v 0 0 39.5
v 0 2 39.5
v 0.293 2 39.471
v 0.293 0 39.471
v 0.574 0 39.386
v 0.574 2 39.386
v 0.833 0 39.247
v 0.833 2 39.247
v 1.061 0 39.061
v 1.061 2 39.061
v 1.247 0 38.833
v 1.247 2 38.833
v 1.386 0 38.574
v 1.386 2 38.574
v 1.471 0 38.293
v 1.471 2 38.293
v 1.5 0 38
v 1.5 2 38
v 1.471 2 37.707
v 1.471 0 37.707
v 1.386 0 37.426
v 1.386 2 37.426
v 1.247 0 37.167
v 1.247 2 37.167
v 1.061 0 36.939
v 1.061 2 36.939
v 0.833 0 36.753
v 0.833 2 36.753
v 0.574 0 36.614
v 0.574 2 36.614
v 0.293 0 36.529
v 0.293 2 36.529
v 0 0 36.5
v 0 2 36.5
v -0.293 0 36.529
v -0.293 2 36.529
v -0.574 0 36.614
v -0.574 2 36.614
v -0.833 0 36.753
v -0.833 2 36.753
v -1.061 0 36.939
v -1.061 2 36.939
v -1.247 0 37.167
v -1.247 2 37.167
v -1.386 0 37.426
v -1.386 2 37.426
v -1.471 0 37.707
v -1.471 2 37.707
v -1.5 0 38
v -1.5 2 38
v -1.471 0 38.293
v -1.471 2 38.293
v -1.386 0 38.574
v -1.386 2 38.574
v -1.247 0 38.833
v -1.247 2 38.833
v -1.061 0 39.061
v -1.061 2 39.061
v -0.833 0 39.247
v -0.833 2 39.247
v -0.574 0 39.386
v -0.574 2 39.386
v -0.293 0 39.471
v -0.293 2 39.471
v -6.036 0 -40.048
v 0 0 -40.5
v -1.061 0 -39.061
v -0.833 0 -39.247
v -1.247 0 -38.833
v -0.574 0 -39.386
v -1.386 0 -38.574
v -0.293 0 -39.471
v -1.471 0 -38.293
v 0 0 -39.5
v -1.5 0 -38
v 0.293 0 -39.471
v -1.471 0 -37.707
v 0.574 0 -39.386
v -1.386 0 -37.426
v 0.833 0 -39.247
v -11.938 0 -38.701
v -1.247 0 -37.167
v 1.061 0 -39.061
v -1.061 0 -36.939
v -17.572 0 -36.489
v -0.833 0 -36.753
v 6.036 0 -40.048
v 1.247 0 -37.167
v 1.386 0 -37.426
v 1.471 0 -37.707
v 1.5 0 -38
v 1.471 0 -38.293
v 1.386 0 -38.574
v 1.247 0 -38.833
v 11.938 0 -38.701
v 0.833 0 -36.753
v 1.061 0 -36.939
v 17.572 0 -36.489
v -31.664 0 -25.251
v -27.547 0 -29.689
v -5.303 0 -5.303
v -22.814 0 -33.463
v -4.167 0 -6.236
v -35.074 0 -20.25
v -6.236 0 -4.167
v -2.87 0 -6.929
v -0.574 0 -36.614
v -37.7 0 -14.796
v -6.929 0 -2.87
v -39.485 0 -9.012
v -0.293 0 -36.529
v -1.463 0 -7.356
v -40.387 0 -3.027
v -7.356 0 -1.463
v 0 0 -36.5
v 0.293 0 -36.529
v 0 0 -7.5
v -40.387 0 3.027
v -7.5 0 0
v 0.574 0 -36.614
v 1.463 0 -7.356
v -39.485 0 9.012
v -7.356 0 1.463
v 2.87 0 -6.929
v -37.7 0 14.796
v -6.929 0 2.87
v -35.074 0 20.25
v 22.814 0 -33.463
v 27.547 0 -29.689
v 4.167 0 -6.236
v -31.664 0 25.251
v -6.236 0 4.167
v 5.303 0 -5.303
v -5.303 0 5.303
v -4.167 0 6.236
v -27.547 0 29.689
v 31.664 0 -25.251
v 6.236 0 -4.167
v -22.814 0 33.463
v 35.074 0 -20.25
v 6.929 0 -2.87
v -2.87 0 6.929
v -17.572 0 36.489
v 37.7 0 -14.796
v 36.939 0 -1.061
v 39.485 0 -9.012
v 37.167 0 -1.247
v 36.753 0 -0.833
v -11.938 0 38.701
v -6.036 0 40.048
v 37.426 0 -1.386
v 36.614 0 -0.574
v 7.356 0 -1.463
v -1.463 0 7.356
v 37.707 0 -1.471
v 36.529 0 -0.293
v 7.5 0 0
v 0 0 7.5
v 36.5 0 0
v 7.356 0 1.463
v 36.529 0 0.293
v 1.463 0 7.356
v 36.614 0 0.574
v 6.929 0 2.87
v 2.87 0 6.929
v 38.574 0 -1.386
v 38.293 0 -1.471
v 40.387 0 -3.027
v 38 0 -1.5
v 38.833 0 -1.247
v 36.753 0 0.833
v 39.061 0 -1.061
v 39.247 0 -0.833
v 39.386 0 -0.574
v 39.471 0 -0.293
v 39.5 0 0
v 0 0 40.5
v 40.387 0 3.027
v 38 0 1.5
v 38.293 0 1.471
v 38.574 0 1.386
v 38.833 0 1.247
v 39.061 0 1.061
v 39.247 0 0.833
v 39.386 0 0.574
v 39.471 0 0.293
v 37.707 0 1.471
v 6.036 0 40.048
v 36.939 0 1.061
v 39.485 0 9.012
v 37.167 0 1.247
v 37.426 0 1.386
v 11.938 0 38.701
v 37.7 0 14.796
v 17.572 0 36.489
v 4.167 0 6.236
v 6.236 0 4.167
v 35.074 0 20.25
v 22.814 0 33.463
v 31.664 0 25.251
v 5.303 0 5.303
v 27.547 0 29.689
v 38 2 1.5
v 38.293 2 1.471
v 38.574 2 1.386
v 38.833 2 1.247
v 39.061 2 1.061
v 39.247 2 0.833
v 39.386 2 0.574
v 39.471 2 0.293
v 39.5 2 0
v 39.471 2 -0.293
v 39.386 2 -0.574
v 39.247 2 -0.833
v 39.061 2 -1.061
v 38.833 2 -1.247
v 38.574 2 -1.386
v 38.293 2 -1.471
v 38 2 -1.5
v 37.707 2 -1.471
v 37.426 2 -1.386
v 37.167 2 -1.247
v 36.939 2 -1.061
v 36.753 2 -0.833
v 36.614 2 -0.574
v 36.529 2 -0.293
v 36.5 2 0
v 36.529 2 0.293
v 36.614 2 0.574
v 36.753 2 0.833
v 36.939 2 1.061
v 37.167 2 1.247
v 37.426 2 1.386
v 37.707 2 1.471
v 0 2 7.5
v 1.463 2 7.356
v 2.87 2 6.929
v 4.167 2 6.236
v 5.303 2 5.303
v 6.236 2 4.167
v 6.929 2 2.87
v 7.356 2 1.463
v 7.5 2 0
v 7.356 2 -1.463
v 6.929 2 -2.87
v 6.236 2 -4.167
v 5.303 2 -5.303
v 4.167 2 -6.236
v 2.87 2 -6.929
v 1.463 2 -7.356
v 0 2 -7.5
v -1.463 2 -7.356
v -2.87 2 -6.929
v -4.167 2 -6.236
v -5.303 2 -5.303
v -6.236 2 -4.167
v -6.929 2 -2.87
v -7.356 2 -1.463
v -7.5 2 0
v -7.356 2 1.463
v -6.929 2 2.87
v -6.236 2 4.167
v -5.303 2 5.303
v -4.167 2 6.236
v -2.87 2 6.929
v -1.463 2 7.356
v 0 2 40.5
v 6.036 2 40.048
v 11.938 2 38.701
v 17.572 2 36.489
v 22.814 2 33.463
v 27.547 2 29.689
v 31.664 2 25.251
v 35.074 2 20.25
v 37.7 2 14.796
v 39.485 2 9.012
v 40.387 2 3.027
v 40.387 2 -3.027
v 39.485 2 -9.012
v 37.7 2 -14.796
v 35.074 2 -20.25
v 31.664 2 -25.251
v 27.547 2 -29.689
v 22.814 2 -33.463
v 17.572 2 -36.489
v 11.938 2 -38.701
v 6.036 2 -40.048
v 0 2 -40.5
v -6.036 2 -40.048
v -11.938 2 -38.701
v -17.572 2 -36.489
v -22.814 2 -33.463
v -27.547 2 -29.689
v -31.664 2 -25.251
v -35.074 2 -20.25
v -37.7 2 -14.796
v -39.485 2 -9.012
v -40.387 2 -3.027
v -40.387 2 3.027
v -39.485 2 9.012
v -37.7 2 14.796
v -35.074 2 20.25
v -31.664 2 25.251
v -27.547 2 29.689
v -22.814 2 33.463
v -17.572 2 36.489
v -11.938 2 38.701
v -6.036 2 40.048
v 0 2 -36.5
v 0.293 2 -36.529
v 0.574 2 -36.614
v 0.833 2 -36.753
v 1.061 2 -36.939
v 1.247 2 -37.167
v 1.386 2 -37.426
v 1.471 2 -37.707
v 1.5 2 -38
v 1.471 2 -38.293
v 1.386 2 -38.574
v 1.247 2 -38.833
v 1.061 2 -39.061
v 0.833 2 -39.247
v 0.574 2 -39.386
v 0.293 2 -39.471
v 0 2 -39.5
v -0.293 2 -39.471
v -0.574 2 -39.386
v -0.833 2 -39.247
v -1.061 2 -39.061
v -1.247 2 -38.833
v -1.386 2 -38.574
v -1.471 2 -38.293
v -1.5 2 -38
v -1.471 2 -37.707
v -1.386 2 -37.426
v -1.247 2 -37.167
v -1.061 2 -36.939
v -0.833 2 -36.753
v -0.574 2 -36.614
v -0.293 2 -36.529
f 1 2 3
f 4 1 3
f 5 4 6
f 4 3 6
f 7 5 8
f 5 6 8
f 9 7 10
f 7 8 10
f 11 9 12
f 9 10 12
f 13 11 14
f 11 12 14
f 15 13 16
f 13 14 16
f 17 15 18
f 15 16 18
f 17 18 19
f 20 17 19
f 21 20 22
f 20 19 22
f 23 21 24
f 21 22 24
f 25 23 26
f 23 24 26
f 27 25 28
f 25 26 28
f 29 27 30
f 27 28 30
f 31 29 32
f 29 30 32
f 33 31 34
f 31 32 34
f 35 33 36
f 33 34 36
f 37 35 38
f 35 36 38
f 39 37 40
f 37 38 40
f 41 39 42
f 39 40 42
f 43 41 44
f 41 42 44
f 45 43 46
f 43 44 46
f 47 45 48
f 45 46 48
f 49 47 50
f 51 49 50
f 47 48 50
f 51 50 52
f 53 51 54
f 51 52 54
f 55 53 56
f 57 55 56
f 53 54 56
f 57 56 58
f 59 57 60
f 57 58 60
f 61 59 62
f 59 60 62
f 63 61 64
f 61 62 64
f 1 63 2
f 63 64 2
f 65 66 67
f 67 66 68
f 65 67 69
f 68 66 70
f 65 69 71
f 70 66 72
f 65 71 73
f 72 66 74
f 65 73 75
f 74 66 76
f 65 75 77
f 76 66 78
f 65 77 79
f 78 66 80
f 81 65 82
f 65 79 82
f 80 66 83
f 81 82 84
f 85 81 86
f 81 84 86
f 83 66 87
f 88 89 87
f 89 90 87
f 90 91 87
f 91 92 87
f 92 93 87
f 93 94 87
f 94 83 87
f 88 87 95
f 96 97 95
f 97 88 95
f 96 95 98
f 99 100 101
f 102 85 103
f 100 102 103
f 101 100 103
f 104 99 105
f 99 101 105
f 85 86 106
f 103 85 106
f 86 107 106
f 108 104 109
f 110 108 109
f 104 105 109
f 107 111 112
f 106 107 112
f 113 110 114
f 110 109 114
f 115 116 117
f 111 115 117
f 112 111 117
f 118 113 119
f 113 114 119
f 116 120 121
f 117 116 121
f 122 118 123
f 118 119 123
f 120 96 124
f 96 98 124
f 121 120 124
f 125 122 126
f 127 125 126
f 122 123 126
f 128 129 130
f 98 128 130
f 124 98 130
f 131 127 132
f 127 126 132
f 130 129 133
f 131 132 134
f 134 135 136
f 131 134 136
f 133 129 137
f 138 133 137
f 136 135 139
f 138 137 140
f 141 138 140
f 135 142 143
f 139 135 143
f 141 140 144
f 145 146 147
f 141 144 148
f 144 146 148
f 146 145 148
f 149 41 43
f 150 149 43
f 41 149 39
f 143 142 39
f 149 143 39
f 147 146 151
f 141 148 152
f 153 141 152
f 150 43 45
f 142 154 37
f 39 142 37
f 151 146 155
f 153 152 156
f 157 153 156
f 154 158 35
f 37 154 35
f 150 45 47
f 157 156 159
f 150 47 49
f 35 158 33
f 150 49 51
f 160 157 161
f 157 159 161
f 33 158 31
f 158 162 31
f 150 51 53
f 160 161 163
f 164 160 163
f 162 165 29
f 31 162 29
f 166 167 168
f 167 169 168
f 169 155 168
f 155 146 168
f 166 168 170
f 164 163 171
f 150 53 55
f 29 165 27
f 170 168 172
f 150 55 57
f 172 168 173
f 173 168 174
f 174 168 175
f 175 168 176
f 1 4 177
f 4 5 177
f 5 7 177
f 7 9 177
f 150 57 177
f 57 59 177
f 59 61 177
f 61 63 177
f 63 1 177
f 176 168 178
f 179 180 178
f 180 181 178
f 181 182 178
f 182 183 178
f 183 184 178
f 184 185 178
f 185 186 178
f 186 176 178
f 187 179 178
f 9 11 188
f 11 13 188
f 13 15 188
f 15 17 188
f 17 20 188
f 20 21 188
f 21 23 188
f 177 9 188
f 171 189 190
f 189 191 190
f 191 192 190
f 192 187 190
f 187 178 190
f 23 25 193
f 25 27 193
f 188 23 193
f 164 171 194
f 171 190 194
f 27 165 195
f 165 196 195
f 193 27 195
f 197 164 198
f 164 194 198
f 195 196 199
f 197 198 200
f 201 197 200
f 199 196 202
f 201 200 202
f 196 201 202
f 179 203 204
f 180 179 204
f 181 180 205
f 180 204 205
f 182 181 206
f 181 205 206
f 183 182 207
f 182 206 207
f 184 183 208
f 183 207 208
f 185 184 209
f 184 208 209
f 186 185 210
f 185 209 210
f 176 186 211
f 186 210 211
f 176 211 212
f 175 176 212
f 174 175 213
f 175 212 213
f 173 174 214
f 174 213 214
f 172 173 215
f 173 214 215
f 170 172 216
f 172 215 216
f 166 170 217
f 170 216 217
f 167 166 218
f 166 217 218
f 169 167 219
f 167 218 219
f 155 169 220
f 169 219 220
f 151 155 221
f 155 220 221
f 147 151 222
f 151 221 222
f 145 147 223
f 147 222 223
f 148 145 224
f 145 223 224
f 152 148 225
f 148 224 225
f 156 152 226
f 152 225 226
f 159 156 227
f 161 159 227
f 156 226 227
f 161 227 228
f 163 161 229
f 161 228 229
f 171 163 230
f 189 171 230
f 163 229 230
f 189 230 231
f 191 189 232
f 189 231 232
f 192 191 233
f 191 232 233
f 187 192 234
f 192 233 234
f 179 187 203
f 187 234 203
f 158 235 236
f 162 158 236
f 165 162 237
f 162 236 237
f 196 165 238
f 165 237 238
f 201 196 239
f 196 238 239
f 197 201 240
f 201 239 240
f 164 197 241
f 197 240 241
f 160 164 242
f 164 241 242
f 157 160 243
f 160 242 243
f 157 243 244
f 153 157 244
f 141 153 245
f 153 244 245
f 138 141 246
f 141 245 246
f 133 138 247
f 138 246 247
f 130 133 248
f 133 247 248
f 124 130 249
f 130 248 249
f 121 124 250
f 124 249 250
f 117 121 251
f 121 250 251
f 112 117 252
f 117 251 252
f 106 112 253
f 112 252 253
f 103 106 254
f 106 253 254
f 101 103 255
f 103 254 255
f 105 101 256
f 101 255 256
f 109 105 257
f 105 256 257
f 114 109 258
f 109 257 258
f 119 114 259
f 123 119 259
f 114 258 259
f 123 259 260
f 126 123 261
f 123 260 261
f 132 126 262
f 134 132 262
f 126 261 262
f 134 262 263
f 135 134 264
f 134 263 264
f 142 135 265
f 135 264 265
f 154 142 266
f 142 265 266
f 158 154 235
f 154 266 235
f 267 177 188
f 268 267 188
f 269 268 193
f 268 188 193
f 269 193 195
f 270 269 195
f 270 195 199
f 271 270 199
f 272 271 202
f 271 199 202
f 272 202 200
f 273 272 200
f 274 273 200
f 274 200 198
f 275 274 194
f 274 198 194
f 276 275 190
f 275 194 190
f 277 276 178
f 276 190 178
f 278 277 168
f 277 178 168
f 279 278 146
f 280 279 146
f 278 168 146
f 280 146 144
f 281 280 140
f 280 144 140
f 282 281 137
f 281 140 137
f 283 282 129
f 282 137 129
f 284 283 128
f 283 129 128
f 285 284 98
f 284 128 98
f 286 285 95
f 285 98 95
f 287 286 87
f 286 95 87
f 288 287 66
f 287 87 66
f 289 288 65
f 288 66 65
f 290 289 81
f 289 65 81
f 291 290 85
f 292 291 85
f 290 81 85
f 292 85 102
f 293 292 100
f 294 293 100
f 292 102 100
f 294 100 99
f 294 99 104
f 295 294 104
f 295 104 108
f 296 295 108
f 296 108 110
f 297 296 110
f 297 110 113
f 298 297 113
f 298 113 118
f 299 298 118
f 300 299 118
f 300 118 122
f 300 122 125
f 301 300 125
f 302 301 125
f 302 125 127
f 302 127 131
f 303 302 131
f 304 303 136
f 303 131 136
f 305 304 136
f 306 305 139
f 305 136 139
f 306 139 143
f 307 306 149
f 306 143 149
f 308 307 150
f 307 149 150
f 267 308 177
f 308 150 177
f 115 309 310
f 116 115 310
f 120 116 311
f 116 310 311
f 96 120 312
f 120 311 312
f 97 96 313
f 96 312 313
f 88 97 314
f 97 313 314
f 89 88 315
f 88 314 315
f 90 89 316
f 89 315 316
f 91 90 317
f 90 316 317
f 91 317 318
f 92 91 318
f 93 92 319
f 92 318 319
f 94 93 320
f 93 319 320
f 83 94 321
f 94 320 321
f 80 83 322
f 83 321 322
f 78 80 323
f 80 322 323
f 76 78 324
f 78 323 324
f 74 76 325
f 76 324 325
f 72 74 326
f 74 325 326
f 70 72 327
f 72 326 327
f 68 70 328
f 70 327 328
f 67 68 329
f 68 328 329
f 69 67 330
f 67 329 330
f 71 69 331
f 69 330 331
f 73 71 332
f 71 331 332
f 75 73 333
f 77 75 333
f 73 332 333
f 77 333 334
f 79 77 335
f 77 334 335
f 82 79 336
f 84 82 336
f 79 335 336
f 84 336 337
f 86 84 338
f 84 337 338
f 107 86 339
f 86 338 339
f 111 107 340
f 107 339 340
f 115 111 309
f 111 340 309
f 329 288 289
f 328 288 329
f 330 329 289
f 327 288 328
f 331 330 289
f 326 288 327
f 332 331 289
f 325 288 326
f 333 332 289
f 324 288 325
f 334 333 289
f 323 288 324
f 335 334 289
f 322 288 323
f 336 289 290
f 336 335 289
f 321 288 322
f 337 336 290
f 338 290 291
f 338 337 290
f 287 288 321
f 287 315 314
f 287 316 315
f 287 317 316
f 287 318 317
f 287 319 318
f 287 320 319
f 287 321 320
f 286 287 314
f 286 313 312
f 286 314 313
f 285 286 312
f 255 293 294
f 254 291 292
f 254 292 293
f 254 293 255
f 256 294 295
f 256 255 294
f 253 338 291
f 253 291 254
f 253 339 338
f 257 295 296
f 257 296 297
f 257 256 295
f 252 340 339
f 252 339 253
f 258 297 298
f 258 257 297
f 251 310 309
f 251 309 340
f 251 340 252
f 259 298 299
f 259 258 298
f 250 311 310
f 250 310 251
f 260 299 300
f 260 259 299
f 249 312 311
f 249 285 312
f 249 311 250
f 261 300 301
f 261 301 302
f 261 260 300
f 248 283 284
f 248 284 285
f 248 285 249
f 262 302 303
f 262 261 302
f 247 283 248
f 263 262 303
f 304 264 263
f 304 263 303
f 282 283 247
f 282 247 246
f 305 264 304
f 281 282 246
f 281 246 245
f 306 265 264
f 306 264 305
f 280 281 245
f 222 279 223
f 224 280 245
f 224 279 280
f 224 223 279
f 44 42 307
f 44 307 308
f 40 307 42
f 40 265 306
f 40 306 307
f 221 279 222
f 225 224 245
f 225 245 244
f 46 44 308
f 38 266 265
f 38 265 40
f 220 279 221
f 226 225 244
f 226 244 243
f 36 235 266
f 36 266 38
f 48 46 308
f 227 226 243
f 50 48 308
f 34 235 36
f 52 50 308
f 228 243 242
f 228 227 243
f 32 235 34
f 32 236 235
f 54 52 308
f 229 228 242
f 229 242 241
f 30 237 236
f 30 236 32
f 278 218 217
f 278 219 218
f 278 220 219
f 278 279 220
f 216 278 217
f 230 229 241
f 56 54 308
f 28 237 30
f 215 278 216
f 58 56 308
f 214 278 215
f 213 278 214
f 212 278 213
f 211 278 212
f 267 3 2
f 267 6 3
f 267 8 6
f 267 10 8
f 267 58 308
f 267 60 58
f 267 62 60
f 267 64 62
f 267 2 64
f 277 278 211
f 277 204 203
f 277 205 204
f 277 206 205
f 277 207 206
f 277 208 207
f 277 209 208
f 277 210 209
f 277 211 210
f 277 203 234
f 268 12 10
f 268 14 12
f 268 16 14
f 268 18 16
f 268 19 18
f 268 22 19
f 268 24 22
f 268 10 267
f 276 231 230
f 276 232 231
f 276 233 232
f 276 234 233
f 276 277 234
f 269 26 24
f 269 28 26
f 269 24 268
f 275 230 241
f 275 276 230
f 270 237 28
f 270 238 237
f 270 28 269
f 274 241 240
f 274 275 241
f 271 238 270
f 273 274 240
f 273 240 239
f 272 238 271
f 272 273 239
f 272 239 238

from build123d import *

# Parameters (mm, degrees)
SKETCH1_R           = 40.5
BOSS_EXTRUDE1_DEPTH = 2
SKETCH2_R           = 1.5
CUT_EXTRUDE1_DEPTH  = 2
SKETCH3_R           = 7.5
CUT_EXTRUDE2_DEPTH  = 2


with BuildPart() as part:
    # Sketch1 → Boss-Extrude1 (new body)
    with BuildSketch(Plane(origin=(0, 0, 0), x_dir=(1, 0, 0), z_dir=(0, 1, 0))):
        with Locations(Location((0, 0, 0), (0, 0, 270))):
            Circle(SKETCH1_R)
    extrude(amount=BOSS_EXTRUDE1_DEPTH)

    # Sketch2 → Cut-Extrude1 (cut)
    with BuildSketch(Plane(origin=(0, 2, 0), x_dir=(1, 0, 0), z_dir=(0, 1, 0))):
        with Locations(Location((0, 38, 0), (0, 0, 270))):
            Circle(SKETCH2_R)
        with Locations(Location((38, 0, 0), (0, 0, 270))):
            Circle(SKETCH2_R)
        with Locations(Location((0, -38, 0), (0, 0, 270))):
            Circle(SKETCH2_R)
    extrude(amount=-CUT_EXTRUDE1_DEPTH, mode=Mode.SUBTRACT)

    # Sketch3 → Cut-Extrude2 (cut)
    with BuildSketch(Plane(origin=(0, 2, 0), x_dir=(1, 0, 0), z_dir=(0, 1, 0))):
        with Locations(Location((0, 0, 0), (0, 0, 270))):
            Circle(SKETCH3_R)
    extrude(amount=-CUT_EXTRUDE2_DEPTH, mode=Mode.SUBTRACT)


solid = part.part
